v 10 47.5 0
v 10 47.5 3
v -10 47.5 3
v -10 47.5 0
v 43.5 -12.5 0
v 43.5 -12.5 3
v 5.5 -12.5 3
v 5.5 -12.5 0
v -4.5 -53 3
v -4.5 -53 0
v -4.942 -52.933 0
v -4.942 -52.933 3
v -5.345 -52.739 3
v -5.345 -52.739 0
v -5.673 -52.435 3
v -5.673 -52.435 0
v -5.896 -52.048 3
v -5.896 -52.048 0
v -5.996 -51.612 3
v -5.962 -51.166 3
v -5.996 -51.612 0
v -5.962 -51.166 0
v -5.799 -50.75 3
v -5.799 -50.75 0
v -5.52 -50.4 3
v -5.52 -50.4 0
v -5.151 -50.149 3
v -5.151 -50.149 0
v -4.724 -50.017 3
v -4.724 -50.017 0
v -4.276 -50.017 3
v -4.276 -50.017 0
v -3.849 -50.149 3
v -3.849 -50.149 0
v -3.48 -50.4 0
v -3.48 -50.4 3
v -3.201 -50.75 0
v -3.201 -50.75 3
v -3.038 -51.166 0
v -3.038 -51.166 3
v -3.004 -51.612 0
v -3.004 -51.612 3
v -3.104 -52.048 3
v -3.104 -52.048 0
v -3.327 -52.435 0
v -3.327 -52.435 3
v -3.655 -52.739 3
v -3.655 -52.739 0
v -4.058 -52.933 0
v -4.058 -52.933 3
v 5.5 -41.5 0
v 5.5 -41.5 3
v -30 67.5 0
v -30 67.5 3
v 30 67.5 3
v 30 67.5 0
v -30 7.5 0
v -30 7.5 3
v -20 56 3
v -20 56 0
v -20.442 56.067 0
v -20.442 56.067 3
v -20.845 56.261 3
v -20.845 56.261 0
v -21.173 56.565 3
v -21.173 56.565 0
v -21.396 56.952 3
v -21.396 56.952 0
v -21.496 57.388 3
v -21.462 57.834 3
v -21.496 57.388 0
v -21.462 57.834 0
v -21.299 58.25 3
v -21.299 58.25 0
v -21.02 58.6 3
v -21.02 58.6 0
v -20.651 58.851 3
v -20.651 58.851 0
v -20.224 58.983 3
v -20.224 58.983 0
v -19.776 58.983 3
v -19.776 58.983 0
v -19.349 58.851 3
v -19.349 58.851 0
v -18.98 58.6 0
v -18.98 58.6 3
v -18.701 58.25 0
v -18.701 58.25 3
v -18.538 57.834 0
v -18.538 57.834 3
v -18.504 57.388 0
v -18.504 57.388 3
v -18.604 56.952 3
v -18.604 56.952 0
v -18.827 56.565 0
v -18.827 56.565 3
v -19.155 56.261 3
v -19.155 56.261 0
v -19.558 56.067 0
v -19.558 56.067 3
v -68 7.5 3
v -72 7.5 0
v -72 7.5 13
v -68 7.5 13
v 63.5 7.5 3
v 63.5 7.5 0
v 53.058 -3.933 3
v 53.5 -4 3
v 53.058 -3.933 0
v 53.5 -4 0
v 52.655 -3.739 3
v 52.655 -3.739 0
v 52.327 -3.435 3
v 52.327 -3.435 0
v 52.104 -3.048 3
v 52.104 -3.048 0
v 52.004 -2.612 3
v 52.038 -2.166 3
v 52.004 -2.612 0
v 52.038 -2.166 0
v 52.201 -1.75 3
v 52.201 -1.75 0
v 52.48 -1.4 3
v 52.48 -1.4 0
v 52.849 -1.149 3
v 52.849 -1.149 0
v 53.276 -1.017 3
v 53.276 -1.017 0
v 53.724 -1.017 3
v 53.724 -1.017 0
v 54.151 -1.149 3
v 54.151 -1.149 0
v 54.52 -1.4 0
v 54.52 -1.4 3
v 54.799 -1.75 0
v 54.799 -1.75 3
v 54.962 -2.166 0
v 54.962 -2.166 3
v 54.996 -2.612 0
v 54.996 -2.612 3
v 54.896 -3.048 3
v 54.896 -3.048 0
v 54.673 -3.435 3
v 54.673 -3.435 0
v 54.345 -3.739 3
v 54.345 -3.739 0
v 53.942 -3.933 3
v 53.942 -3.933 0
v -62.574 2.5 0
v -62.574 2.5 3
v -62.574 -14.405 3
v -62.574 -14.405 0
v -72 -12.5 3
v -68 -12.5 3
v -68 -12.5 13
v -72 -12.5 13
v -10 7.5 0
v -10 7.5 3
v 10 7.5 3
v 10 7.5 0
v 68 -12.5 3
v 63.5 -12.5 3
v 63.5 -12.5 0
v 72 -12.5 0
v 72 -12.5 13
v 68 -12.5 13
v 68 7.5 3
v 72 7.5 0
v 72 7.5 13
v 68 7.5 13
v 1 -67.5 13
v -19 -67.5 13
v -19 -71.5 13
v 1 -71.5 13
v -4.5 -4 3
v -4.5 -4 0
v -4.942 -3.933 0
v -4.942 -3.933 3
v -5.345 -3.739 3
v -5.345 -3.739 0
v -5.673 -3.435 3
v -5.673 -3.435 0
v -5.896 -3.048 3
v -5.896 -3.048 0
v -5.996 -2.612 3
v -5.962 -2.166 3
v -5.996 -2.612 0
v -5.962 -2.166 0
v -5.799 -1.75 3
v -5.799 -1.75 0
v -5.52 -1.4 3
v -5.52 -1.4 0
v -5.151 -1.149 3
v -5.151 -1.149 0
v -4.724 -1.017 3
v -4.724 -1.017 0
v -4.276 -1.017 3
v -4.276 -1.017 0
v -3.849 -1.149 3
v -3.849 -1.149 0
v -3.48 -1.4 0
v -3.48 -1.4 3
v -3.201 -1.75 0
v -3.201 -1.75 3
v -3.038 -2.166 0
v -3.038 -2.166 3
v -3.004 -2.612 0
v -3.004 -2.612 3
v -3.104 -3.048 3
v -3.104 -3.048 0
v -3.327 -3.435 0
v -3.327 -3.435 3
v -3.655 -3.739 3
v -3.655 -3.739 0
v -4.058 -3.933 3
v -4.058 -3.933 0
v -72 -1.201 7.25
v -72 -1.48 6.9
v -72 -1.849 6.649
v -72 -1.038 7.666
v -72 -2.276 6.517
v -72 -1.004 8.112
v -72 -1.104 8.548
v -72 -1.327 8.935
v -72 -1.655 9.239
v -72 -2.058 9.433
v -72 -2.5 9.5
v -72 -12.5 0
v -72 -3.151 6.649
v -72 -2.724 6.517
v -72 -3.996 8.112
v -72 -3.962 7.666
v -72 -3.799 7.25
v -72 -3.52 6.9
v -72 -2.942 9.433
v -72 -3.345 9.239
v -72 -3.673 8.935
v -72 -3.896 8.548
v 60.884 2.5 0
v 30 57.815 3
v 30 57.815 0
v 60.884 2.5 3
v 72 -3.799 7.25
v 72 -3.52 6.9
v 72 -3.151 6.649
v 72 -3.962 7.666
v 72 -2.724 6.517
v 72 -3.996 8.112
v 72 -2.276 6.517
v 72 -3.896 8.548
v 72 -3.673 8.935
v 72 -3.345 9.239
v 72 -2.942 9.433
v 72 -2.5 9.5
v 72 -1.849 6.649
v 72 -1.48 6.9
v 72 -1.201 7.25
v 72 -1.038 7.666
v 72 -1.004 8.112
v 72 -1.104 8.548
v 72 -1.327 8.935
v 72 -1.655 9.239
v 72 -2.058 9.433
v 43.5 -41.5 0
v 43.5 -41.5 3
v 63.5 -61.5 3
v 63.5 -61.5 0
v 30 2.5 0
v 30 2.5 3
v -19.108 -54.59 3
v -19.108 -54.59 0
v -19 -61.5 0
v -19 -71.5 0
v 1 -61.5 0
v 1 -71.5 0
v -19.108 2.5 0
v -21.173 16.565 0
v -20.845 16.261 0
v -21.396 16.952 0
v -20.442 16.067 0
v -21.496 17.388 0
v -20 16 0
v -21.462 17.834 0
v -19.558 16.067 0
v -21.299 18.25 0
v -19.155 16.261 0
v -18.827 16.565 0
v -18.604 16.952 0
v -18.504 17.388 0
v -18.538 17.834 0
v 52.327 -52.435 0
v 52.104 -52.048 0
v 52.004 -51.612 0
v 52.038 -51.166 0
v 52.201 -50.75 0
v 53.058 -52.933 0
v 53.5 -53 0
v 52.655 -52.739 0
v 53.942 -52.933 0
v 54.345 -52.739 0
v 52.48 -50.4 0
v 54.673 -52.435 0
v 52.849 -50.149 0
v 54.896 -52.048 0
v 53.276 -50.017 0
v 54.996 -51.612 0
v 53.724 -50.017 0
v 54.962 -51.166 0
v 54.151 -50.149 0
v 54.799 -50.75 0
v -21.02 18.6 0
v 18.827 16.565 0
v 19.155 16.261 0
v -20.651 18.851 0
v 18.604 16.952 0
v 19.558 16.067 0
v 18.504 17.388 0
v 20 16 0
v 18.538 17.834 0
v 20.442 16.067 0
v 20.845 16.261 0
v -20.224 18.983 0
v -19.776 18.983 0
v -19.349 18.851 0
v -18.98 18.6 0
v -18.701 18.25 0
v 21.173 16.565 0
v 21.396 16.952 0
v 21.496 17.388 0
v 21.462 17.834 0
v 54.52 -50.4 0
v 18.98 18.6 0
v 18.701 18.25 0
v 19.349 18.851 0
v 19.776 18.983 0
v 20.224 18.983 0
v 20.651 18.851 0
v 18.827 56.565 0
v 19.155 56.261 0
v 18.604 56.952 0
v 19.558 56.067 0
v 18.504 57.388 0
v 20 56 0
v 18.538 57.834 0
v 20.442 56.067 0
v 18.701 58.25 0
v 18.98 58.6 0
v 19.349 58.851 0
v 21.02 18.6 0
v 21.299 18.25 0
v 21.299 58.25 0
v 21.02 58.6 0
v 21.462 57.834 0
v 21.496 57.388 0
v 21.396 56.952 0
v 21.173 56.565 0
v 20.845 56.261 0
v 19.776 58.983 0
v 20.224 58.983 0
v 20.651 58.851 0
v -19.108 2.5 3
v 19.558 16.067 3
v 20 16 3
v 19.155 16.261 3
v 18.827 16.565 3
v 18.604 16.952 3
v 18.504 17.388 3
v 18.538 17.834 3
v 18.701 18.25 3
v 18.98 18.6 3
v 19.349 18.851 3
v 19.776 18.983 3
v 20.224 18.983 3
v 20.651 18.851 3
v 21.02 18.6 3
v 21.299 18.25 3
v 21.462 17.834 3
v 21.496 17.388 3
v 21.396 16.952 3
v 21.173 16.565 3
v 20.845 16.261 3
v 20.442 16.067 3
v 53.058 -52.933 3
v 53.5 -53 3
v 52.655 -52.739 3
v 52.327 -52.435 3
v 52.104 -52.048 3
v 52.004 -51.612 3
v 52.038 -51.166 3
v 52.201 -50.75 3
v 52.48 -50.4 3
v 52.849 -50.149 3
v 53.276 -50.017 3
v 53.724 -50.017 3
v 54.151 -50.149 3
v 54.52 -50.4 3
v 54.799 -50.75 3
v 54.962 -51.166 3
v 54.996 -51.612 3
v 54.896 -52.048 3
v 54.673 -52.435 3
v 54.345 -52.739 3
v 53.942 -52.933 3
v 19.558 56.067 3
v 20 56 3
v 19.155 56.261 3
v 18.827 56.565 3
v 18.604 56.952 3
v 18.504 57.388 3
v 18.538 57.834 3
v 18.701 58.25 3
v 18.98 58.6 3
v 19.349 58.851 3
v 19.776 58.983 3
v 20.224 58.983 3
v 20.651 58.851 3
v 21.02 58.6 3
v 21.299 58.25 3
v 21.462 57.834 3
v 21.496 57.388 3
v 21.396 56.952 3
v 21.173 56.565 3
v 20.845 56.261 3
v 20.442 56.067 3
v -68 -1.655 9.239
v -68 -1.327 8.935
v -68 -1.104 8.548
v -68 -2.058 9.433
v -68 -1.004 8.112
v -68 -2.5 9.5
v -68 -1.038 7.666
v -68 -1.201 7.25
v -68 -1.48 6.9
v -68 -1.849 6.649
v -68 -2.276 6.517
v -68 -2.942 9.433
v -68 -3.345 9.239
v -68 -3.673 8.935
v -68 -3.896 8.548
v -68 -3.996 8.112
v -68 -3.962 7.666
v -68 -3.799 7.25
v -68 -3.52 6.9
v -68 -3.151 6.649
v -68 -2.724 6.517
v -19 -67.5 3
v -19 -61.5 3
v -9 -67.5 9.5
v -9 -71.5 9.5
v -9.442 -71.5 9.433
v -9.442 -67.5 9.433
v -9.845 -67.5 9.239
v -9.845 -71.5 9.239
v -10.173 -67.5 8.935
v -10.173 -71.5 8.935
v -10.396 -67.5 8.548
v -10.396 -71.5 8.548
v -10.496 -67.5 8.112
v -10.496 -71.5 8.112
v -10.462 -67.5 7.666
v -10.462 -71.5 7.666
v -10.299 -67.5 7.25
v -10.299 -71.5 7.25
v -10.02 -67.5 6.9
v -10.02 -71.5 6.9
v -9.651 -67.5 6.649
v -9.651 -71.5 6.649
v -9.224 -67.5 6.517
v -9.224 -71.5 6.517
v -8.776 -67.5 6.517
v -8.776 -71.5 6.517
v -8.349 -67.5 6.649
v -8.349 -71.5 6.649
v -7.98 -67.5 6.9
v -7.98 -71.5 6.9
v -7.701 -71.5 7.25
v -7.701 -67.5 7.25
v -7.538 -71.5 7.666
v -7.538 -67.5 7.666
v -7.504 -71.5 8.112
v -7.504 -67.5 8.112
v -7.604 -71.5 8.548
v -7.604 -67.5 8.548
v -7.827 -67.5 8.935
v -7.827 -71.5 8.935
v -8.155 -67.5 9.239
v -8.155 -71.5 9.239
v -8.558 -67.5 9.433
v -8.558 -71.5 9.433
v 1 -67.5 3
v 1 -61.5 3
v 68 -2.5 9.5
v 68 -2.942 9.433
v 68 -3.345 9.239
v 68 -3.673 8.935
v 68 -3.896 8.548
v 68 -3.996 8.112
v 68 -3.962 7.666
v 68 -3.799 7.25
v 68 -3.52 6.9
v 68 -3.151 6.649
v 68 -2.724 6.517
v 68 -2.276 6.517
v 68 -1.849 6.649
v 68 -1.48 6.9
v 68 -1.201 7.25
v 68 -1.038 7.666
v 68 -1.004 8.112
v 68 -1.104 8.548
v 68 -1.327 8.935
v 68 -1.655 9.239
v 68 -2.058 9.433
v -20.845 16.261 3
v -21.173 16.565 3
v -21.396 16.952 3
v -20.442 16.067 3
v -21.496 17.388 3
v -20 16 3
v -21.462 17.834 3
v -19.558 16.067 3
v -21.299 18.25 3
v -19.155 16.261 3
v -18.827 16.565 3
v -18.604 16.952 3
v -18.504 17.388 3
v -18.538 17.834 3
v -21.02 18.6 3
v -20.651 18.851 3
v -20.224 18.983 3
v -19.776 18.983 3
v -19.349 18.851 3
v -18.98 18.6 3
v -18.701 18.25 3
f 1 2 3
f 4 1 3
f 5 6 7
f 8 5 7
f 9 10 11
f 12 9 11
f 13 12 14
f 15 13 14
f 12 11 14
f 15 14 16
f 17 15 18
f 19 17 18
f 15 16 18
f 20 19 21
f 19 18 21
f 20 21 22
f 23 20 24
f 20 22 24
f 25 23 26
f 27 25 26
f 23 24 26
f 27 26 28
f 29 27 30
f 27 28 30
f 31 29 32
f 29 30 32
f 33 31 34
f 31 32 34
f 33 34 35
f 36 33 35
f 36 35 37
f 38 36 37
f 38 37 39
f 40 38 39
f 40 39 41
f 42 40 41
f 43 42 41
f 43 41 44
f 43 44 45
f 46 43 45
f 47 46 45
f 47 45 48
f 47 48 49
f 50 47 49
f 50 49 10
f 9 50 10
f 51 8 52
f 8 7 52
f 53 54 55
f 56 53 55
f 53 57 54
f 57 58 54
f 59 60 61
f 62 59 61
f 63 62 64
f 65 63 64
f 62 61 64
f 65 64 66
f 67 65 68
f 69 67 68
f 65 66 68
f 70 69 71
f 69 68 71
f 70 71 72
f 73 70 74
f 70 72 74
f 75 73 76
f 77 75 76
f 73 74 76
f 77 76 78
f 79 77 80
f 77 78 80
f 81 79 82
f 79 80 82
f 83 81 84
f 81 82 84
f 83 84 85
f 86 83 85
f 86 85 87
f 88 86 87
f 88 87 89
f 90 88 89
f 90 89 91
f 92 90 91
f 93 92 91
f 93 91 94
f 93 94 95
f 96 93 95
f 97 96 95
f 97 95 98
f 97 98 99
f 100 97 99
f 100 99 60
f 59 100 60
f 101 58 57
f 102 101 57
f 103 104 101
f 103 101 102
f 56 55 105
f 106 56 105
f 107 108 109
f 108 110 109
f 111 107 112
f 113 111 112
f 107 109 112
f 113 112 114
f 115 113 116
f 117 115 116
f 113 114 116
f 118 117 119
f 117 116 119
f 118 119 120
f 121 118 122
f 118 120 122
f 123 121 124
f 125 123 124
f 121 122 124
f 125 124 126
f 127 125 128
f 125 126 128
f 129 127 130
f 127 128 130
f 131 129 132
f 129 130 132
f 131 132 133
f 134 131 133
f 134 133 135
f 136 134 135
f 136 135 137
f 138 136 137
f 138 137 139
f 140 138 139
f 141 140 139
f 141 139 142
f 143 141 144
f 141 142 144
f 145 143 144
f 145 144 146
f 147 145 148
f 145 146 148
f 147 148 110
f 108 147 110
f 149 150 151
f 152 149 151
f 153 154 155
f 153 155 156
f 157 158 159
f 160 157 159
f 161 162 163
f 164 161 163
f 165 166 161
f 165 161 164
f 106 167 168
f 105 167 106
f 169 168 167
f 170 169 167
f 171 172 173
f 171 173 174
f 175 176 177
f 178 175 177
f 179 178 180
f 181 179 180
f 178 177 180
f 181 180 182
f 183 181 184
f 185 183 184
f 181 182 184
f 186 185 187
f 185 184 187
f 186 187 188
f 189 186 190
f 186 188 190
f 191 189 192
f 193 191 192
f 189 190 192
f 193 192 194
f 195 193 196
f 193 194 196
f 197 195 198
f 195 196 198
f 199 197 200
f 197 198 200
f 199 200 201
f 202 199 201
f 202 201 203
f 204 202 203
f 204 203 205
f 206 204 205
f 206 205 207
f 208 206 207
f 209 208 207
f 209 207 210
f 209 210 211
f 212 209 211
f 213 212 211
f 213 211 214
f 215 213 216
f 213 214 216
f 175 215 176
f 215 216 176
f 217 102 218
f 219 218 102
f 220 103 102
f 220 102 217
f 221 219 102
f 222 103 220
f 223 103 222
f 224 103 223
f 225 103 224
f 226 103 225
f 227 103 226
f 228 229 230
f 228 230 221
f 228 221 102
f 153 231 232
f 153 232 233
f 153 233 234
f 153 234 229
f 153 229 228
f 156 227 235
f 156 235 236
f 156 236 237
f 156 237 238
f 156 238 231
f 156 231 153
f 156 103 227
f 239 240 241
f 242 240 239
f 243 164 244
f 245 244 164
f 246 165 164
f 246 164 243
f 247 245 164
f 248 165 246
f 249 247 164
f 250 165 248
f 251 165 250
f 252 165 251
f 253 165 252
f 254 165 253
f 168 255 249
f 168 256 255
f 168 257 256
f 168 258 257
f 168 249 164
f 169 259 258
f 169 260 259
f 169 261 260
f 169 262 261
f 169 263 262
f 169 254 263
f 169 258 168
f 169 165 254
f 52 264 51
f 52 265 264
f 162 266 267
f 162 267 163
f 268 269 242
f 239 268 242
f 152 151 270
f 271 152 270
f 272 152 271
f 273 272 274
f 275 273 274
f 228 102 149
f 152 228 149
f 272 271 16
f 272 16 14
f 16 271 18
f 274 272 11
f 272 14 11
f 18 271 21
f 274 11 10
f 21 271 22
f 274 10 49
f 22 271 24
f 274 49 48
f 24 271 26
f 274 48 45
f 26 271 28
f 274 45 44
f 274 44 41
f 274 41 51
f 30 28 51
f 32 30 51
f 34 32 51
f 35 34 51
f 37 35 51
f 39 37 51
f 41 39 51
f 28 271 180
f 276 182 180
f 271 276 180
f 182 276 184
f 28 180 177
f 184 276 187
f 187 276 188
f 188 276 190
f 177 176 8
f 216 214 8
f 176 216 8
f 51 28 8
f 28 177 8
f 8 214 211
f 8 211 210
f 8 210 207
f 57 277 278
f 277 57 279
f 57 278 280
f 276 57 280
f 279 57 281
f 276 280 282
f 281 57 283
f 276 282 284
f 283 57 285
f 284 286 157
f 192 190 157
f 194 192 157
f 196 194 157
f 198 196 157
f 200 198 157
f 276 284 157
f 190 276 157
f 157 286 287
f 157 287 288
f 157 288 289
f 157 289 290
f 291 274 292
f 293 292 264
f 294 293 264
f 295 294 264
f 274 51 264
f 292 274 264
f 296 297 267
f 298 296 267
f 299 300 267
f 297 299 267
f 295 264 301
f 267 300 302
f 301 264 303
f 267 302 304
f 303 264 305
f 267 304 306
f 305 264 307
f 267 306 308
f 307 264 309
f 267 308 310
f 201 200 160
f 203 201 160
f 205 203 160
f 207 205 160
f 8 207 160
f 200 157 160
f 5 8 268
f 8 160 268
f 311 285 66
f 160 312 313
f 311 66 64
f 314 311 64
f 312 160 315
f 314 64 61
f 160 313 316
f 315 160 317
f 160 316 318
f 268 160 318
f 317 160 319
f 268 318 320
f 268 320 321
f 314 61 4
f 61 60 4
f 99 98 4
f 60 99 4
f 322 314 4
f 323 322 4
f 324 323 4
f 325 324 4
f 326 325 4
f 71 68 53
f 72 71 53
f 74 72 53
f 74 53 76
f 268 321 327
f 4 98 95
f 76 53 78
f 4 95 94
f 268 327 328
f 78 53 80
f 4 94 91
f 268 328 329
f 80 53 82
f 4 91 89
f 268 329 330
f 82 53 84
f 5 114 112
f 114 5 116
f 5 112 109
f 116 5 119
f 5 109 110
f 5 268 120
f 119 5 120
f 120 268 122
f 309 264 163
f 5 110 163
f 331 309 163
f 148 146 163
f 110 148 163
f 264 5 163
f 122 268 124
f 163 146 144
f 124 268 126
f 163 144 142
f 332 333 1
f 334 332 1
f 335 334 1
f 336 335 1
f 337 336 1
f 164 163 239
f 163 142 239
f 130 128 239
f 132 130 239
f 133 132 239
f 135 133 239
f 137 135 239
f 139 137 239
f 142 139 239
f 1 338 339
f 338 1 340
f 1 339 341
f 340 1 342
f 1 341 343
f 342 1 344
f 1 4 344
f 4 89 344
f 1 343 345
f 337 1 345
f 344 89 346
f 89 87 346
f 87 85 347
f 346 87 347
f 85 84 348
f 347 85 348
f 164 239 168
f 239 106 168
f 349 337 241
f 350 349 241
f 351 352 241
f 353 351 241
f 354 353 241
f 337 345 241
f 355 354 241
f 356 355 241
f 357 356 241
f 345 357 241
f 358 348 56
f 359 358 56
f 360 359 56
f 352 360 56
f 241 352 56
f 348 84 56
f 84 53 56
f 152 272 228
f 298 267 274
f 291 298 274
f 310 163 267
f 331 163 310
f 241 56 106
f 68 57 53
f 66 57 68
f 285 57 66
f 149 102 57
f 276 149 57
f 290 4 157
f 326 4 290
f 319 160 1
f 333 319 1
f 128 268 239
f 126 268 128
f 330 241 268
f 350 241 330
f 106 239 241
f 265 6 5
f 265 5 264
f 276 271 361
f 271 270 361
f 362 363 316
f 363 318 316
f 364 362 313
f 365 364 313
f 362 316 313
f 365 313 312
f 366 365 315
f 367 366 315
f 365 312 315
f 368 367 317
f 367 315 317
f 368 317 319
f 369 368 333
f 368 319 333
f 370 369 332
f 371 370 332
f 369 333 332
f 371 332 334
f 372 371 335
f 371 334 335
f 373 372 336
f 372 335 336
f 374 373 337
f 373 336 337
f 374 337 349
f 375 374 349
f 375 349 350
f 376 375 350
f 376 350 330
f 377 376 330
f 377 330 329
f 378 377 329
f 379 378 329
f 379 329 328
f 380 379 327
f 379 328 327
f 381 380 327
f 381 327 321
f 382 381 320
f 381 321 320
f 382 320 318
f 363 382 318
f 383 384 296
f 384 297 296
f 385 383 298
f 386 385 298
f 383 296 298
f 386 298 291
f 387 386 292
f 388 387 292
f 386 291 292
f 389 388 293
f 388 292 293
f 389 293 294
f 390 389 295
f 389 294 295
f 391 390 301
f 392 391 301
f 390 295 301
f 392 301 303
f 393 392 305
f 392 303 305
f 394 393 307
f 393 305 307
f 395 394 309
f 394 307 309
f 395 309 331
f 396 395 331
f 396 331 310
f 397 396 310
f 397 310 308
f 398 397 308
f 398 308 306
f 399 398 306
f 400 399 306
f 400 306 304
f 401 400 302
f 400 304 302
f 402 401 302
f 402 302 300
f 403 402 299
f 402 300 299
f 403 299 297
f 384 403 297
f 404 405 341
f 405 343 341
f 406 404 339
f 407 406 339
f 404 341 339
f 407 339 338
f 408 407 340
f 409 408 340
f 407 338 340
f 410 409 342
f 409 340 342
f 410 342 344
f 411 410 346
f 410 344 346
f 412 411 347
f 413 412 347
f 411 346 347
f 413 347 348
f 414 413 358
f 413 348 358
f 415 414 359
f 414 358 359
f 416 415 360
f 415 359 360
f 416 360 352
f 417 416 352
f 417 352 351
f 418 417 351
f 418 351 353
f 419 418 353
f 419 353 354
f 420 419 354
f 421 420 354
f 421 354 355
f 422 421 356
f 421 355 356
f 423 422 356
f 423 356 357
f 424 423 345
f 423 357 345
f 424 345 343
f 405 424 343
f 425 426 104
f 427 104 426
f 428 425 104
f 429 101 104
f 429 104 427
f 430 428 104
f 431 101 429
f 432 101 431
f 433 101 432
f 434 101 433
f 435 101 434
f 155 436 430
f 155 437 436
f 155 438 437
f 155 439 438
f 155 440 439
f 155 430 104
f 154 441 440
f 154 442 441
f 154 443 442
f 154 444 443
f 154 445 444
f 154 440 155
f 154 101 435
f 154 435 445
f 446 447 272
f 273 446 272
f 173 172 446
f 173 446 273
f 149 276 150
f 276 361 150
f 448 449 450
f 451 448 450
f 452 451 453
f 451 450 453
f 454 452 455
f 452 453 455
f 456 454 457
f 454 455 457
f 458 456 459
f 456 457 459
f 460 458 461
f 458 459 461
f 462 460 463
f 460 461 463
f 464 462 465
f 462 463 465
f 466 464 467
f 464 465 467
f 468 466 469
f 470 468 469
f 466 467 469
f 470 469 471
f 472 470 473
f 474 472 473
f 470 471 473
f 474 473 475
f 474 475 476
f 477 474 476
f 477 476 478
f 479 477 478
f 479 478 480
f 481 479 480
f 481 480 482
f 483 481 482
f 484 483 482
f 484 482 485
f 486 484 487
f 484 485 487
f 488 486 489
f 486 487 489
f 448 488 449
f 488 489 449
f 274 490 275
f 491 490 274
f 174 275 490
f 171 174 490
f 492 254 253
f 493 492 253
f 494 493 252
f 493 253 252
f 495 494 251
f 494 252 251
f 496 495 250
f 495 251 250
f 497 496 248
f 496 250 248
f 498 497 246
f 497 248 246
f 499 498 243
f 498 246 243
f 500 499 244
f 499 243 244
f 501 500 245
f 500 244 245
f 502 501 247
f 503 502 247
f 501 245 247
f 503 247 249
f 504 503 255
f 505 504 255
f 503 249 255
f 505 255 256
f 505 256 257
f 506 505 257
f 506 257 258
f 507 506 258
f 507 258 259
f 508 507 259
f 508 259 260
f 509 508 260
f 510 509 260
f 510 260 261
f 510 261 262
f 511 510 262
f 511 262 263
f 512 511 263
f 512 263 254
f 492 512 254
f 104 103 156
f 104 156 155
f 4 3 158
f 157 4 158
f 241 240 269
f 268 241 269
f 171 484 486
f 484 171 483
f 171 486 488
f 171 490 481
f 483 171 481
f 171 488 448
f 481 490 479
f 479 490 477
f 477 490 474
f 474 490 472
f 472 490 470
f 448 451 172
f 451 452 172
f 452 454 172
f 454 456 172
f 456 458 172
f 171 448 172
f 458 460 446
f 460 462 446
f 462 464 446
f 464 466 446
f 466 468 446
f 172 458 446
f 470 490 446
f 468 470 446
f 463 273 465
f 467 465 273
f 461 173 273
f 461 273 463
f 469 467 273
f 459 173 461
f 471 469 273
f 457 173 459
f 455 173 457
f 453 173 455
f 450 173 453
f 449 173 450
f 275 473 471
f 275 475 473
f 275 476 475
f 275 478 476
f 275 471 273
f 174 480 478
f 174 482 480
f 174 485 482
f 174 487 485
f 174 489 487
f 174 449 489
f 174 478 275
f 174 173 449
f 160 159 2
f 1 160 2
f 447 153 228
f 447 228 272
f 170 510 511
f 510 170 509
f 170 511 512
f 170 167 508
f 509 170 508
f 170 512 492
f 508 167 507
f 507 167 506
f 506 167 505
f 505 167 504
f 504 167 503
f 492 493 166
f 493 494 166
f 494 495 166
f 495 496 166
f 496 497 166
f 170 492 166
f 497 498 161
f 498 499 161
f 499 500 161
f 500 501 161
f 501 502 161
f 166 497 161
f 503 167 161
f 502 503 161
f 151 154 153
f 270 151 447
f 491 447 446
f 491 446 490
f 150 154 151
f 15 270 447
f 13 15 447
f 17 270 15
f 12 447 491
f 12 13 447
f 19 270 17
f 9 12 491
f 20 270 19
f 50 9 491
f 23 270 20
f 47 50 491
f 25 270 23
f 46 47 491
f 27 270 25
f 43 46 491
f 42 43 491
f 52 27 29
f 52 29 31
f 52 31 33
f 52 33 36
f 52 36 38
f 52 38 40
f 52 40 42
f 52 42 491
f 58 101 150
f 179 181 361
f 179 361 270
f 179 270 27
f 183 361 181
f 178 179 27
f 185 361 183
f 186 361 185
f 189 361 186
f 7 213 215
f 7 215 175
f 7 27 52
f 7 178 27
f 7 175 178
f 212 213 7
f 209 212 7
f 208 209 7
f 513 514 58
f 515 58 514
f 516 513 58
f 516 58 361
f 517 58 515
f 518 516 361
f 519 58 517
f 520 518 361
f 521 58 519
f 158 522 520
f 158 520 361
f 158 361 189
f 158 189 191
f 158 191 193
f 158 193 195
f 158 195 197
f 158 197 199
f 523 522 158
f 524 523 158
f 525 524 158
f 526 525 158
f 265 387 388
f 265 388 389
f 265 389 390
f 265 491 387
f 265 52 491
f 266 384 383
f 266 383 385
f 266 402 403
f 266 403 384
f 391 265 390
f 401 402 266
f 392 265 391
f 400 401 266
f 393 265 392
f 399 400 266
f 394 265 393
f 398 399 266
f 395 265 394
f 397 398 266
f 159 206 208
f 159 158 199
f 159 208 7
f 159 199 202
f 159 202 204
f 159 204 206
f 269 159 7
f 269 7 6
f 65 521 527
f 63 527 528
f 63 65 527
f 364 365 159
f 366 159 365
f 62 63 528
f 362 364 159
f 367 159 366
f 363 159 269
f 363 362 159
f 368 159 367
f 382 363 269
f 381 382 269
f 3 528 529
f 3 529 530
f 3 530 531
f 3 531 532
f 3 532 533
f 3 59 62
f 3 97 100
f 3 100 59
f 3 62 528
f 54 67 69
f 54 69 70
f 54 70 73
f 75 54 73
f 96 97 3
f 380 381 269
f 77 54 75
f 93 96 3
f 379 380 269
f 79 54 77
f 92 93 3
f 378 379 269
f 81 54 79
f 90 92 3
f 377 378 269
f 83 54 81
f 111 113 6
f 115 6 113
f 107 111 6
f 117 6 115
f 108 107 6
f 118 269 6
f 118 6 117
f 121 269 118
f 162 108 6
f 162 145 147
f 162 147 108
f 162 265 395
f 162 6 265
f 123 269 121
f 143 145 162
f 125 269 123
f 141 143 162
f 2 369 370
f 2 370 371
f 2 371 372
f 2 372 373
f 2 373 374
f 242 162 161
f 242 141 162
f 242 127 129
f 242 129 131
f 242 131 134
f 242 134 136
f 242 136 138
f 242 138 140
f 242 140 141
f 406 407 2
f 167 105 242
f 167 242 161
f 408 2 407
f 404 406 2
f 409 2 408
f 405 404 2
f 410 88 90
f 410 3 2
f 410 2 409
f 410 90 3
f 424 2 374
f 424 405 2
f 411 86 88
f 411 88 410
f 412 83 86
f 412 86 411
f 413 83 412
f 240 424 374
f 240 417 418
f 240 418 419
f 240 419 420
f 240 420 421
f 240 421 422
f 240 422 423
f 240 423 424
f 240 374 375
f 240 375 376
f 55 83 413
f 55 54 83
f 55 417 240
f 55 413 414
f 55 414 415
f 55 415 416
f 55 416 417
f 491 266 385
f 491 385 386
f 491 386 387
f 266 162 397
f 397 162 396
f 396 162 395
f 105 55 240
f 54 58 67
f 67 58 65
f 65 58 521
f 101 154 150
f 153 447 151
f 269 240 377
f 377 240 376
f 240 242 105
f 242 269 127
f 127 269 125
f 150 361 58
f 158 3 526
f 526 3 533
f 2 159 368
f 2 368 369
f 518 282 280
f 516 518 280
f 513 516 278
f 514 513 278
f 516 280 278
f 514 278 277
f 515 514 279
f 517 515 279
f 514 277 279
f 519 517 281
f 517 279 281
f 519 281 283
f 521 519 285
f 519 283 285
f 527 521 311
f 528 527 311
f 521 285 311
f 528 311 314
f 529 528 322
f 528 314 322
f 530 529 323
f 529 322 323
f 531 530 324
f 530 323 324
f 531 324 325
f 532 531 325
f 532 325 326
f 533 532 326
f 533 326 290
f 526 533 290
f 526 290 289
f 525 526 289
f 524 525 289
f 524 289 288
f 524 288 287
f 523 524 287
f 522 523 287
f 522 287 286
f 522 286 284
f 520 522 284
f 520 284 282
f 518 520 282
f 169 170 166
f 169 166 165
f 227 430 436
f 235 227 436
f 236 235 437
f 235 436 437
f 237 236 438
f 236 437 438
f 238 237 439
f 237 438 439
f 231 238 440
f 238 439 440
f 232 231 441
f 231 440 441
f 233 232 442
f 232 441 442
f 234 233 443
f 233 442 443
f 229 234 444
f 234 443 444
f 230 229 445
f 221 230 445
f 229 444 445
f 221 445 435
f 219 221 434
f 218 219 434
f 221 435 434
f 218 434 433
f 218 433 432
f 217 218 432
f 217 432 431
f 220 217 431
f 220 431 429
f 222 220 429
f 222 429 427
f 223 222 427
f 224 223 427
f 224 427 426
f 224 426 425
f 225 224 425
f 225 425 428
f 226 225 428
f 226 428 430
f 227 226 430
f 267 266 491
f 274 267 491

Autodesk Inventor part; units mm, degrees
ref_plane "YZ Plane" through (0, 0, 0) normal (1, 0, 0) x (0, 1, 0)
ref_plane "XZ Plane" through (0, 0, 0) normal (0, 1, 0) x (-1, 0, 0)
ref_plane "XY Plane" through (0, 0, 0) normal (0, 0, 1) x (1, 0, 0)
sketch "Szkic1" plane through (0, 0, 0) normal (0, 0, 1) x (1, 0, 0)
  line L0 (72, -75) -> (-72, -75)
  line L1 (-72, -75) -> (-72, 75)
  line L2 (-72, 75) -> (72, 75)
  line L3 (72, 75) -> (72, -75)
  line L4 (72, -75) -> (-72, 75) construction
  line L5 (-72, -75) -> (72, 75) construction
  point P0 (0, 0)
  dimension "d0" = 144
  dimension "d1" = 150
extrude "Wyciągnięcie proste1" add sketch "Szkic1" along normal blind 3
sketch "Szkic2" plane through (0, 0, 3) normal (0, 0, 1) x (1, 0, 0)
  line L0 (72, -75) -> (72, 75) projected
  line L1 (-72, -75) -> (72, -75)
  line L2 (72, -75) -> (72, 75)
  line L3 (72, 75) -> (-72, 75)
  line L4 (-72, 75) -> (-72, -75)
  line L5 (-72, -75) -> (72, 75) construction
  line L6 (72, -75) -> (-72, 75) construction
  line L7 (-20, 17.5) -> (20, 17.5)
  line L8 (20, 17.5) -> (20, 57.5)
  line L9 (20, 57.5) -> (-20, 57.5)
  line L10 (-20, 57.5) -> (-20, 17.5)
  point P0 (0, 0)
  point P1 (53.5, -2.5)
  point P2 (53.5, -51.5)
  point P3 (-4.5, -51.5)
  point P4 (-4.5, -2.5)
  dimension "d12" = 58
  dimension "d14" = 58
  dimension "d15" = 49
  dimension "d16" = 18.5
  dimension "d17" = 72.5
  dimension "d18" = 23.5
  dimension "d19" = 18.5
  dimension "d20" = 23.5
  dimension "d21" = 40
  dimension "d22" = 40
  dimension "d23" = 20
  dimension "d24" = 52
hole "Otwór1" at (53.5, -2.5, 3) at (53.5, -51.5, 3) at (-4.5, -51.5, 3) at (-4.5, -2.5, 3) at (-20, 57.5, 3) at (20, 57.5, 3) at (20, 17.5, 3) at (-20, 17.5, 3) direction (0, 0, -1) diameter 3 end through all
sketch "Szkic3" plane through (0, 0, 3) normal (0, 0, 1) x (1, 0, 0)
  line L0 (-30, 67.5) -> (-10, 67.5)
  line L1 (-10, 75) -> (-10, 7.5)
  line L2 (-10, 7.5) -> (-30, 7.5)
  line L3 (-30, 7.5) -> (-30, 75)
  circle A0 centre (-20, 57.5) radius 1.5 projected
  line L4 (10, 67.5) -> (30, 67.5)
  line L5 (30, 67.5) -> (30, 0)
  line L6 (30, 0) -> (10, 0)
  line L7 (10, 0) -> (10, 67.5)
  circle A1 centre (20, 57.5) radius 1.5 projected
  line L8 (30, 67.5) -> (30, 47.5)
  line L9 (-30, 47.5) -> (-30, 67.5)
  line L10 (-14.5, 7.5) -> (5.5, 7.5)
  line L11 (5.5, 7.5) -> (5.5, -61.5)
  line L12 (5.5, -61.5) -> (-14.5, -61.5)
  line L13 (-14.5, -61.5) -> (-14.5, 7.5)
  circle A2 centre (-4.5, -51.5) radius 1.5 projected
  circle A3 centre (-4.5, -2.5) radius 1.5 projected
  line L14 (-30, 67.5) -> (30, 67.5)
  line L15 (30, 67.5) -> (30, 47.5)
  line L16 (30, 47.5) -> (-30, 47.5)
  line L17 (-30, 47.5) -> (-30, 67.5)
  line L18 (-14.5, 7.5) -> (63.5, 7.5)
  line L19 (63.5, 7.5) -> (63.5, -12.5)
  line L20 (63.5, -12.5) -> (-14.5, -12.5)
  line L21 (-14.5, -12.5) -> (-14.5, 7.5)
  circle A4 centre (53.5, -2.5) radius 1.5 projected
  line L22 (63.5, 7.5) -> (43.5, 7.5)
  line L23 (43.5, 7.5) -> (43.5, -61.5)
  line L24 (43.5, -61.5) -> (63.5, -61.5)
  line L25 (63.5, -61.5) -> (63.5, 7.5)
  circle A5 centre (53.5, -51.5) radius 1.5 projected
  line L26 (-14.5, -61.5) -> (63.5, -61.5)
  line L27 (63.5, -61.5) -> (63.5, -41.5)
  line L28 (63.5, -41.5) -> (-14.5, -41.5)
  line L29 (-14.5, -41.5) -> (-14.5, -61.5)
  line L30 (72, 75) -> (-72, 75) projected
  line L31 (-72, -75) -> (72, -75) projected
  line L32 (-72, 75) -> (72, 75)
  line L33 (72, 75) -> (72, -75)
  line L34 (72, -75) -> (-72, -75)
  line L35 (-72, -75) -> (-72, 75)
  line L36 (-30, 67.5) -> (-10, 67.5)
  line L37 (-10, 67.5) -> (-10, 7.5)
  line L38 (-10, 7.5) -> (-30, 7.5)
  line L39 (-30, 7.5) -> (-30, 67.5)
  point P0 (0, 0)
  dimension "d32" = 20
  dimension "d33" = 10
  dimension "d34" = 20
  dimension "d36" = 10
  dimension "d37" = 20
  dimension "d39" = 20
  dimension "d40" = 10
  dimension "d42" = 10
  dimension "d44" = 10
  dimension "d46" = 10
  dimension "d47" = 10
  dimension "d48" = 60
  dimension "d49" = 20
  dimension "d51" = 78
  dimension "d52" = 10
  dimension "d53" = 20
  dimension "d54" = 20
  dimension "d55" = 78
  dimension "d56" = 20
extrude "Wyciągnięcie proste2" cut sketch "Szkic3" against normal blind 10 contours L3 L30 L1 L0 | L3 L2 L13 L12 L26 L24 L25 L19 L18 L5 L4 L14 L1 L30 L33 L31 L35 | L16 L7 L18 L10 L1 | L20 L23 L28 L11
sketch "Szkic4" plane through (0, 0, 3) normal (0, 0, 1) x (1, 0, 0)
  line L0 (30, 7.5) -> (30, 67.5) projected
  line L1 (63.5, 7.5) -> (63.5, -61.5) projected
  line L2 (30, 67.5) -> (63.5, 7.5)
  line L3 (30, 7.5) -> (63.5, 7.5) projected
  line L4 (63.5, 7.5) -> (30, 7.5)
  line L5 (-30, 67.5) -> (30, 67.5) projected
  line L6 (30, 7.5) -> (30, 67.5)
  line L7 (-19, -71.5) -> (1, -71.5)
  line L8 (1, -71.5) -> (1, -61.5)
  line L9 (1, -61.5) -> (-19, -61.5)
  line L10 (-19, -61.5) -> (-19, -71.5)
  line L11 (-19, -71.5) -> (1, -61.5) construction
  line L12 (1, -71.5) -> (-19, -61.5) construction
  circle A0 centre (-4.5, -51.5) radius 1.5 projected
  line L13 (-19, -61.5) -> (-14.5, -61.5)
  line L14 (-30, 7.5) -> (-30, 67.5) projected
  line L15 (63.5, -12.5) -> (72, -12.5)
  line L16 (72, -12.5) -> (72, 7.5)
  line L17 (72, 7.5) -> (63.5, 7.5)
  line L18 (63.5, 7.5) -> (63.5, -12.5)
  line L19 (63.5, -12.5) -> (72, 7.5) construction
  line L20 (72, -12.5) -> (63.5, 7.5) construction
  circle A1 centre (53.5, -2.5) radius 1.5 projected
  line L21 (-14.5, -61.5) -> (-14.5, 7.5) projected
  line L22 (-14.5, 7.5) -> (-72, 7.5)
  line L23 (-72, 7.5) -> (-72, -12.5)
  line L24 (-72, -12.5) -> (-14.5, -12.5)
  line L25 (-14.5, -12.5) -> (-14.5, 7.5)
  line L26 (-72, -12.5) -> (-19, -61.5)
  line L27 (-14.5, -61.5) -> (-14.5, -12.5)
  point P0 (0, 0)
  point P1 (-9, -66.5)
  point P2 (67.75, -2.5)
  dimension "d59" = 20
  dimension "d60" = 10
  dimension "d61" = 15
  dimension "d62" = 4.5
  dimension "d63" = 8.5
  dimension "d64" = 20
  dimension "d65" = 18.5
  dimension "d67" = 10
  dimension "d68" = 57.5
  dimension "d69" = 20
extrude "Wyciągnięcie proste3" add sketch "Szkic4" against normal blind 3 contours L22 L21 L24 L23 | L17 L16 L15 L1 | L0 L2 L3 | L21 L9 L26 L24 | L9 L8 L7 L10
sketch "Szkic5" plane through (0, 0, 3) normal (0, 0, 1) x (1, 0, 0)
  line L0 (63.5, 7.5) -> (72, 7.5) projected
  line L1 (72, 7.5) -> (68, 7.5)
  line L2 (68, 7.5) -> (68, -12.5)
  line L3 (68, -12.5) -> (72, -12.5)
  line L4 (72, -12.5) -> (72, 7.5)
  line L5 (-72, 7.5) -> (-30, 7.5) projected
  line L6 (-72, 7.5) -> (-68, 7.5)
  line L7 (-68, 7.5) -> (-68, -12.5)
  line L8 (-68, -12.5) -> (-72, -12.5)
  line L9 (-72, -12.5) -> (-72, 7.5)
  line L10 (1, -71.5) -> (-19, -71.5) projected
  line L11 (1, -61.5) -> (1, -71.5) projected
  line L12 (-19, -71.5) -> (1, -71.5)
  line L13 (1, -71.5) -> (1, -67.5)
  line L14 (1, -67.5) -> (-19, -67.5)
  line L15 (-19, -67.5) -> (-19, -71.5)
  point P0 (0, 0)
  dimension "d72" = 4
  dimension "d73" = 20
  dimension "d74" = 4
  dimension "d75" = 4
extrude "Wyciągnięcie proste4" add sketch "Szkic5" along normal blind 10
sketch "Szkic6" plane through (-72, -12.5, 0) normal (-1, 0, 0) x (0, 0, 1)
  line L0 (13, 0) -> (13, 20) projected
  line L1 (0, 20) -> (13, 20) projected
  point P0 (0, 12.5)
  point P1 (8, 10)
  dimension "d78" = 5
  dimension "d79" = 10
hole "Otwór2" at (-72, -2.5, 8) direction (1, 0, 0) diameter 3 end through all
sketch "Szkic7" plane through (-19, -67.5, 3) normal (0, 1, 0) x (1, 0, 0)
  line L0 (20, -10) -> (0, -10) projected
  line L1 (20, 0) -> (20, -10) projected
  point P0 (19, 3)
  point P1 (10, -5)
  dimension "d87" = 5
  dimension "d88" = 10
hole "Otwór3" at (-9, -67.5, 8) direction (0, -1, 0) diameter 3 end through all
sketch "Szkic8" plane through (0, 0, 3) normal (0, 0, 1) x (1, 0, 0)
  line L0 (-72, -12.5) -> (-19, -61.5) projected
  line L1 (-19.1082, -54.5905) -> (-19.1082, 2.5)
  line L2 (-19.1082, 2.5) -> (-62.5745, 2.5)
  line L3 (-72, 7.5) -> (-30, 7.5) projected
  line L4 (-62.5745, 2.5) -> (-62.5745, -14.4046)
  line L5 (-62.5745, -14.4046) -> (-19.1082, -54.5905)
  line L6 (-72, 7.5) -> (-72, -12.5) projected
  line L7 (63.5, 7.5) -> (30, 67.5) projected
  line L8 (30, 57.8154) -> (30, 2.5)
  line L9 (30, 57.8154) -> (60.8845, 2.5)
  line L10 (30, 2.5) -> (60.8845, 2.5)
  line L11 (-30, 67.5) -> (-30, 7.5) projected
  point P0 (0, 0)
  dimension "d97" = 5
  dimension "d98" = 16.9046
  dimension "d99" = 40.1859
  dimension "d100" = 9.4254
  dimension "d102" = 5
  dimension "d103" = 55.3154
  dimension "d104" = 60
extrude "Wyciągnięcie proste5" cut sketch "Szkic8" against normal blind 10
properties part number "Uchwyt_elektronika"
